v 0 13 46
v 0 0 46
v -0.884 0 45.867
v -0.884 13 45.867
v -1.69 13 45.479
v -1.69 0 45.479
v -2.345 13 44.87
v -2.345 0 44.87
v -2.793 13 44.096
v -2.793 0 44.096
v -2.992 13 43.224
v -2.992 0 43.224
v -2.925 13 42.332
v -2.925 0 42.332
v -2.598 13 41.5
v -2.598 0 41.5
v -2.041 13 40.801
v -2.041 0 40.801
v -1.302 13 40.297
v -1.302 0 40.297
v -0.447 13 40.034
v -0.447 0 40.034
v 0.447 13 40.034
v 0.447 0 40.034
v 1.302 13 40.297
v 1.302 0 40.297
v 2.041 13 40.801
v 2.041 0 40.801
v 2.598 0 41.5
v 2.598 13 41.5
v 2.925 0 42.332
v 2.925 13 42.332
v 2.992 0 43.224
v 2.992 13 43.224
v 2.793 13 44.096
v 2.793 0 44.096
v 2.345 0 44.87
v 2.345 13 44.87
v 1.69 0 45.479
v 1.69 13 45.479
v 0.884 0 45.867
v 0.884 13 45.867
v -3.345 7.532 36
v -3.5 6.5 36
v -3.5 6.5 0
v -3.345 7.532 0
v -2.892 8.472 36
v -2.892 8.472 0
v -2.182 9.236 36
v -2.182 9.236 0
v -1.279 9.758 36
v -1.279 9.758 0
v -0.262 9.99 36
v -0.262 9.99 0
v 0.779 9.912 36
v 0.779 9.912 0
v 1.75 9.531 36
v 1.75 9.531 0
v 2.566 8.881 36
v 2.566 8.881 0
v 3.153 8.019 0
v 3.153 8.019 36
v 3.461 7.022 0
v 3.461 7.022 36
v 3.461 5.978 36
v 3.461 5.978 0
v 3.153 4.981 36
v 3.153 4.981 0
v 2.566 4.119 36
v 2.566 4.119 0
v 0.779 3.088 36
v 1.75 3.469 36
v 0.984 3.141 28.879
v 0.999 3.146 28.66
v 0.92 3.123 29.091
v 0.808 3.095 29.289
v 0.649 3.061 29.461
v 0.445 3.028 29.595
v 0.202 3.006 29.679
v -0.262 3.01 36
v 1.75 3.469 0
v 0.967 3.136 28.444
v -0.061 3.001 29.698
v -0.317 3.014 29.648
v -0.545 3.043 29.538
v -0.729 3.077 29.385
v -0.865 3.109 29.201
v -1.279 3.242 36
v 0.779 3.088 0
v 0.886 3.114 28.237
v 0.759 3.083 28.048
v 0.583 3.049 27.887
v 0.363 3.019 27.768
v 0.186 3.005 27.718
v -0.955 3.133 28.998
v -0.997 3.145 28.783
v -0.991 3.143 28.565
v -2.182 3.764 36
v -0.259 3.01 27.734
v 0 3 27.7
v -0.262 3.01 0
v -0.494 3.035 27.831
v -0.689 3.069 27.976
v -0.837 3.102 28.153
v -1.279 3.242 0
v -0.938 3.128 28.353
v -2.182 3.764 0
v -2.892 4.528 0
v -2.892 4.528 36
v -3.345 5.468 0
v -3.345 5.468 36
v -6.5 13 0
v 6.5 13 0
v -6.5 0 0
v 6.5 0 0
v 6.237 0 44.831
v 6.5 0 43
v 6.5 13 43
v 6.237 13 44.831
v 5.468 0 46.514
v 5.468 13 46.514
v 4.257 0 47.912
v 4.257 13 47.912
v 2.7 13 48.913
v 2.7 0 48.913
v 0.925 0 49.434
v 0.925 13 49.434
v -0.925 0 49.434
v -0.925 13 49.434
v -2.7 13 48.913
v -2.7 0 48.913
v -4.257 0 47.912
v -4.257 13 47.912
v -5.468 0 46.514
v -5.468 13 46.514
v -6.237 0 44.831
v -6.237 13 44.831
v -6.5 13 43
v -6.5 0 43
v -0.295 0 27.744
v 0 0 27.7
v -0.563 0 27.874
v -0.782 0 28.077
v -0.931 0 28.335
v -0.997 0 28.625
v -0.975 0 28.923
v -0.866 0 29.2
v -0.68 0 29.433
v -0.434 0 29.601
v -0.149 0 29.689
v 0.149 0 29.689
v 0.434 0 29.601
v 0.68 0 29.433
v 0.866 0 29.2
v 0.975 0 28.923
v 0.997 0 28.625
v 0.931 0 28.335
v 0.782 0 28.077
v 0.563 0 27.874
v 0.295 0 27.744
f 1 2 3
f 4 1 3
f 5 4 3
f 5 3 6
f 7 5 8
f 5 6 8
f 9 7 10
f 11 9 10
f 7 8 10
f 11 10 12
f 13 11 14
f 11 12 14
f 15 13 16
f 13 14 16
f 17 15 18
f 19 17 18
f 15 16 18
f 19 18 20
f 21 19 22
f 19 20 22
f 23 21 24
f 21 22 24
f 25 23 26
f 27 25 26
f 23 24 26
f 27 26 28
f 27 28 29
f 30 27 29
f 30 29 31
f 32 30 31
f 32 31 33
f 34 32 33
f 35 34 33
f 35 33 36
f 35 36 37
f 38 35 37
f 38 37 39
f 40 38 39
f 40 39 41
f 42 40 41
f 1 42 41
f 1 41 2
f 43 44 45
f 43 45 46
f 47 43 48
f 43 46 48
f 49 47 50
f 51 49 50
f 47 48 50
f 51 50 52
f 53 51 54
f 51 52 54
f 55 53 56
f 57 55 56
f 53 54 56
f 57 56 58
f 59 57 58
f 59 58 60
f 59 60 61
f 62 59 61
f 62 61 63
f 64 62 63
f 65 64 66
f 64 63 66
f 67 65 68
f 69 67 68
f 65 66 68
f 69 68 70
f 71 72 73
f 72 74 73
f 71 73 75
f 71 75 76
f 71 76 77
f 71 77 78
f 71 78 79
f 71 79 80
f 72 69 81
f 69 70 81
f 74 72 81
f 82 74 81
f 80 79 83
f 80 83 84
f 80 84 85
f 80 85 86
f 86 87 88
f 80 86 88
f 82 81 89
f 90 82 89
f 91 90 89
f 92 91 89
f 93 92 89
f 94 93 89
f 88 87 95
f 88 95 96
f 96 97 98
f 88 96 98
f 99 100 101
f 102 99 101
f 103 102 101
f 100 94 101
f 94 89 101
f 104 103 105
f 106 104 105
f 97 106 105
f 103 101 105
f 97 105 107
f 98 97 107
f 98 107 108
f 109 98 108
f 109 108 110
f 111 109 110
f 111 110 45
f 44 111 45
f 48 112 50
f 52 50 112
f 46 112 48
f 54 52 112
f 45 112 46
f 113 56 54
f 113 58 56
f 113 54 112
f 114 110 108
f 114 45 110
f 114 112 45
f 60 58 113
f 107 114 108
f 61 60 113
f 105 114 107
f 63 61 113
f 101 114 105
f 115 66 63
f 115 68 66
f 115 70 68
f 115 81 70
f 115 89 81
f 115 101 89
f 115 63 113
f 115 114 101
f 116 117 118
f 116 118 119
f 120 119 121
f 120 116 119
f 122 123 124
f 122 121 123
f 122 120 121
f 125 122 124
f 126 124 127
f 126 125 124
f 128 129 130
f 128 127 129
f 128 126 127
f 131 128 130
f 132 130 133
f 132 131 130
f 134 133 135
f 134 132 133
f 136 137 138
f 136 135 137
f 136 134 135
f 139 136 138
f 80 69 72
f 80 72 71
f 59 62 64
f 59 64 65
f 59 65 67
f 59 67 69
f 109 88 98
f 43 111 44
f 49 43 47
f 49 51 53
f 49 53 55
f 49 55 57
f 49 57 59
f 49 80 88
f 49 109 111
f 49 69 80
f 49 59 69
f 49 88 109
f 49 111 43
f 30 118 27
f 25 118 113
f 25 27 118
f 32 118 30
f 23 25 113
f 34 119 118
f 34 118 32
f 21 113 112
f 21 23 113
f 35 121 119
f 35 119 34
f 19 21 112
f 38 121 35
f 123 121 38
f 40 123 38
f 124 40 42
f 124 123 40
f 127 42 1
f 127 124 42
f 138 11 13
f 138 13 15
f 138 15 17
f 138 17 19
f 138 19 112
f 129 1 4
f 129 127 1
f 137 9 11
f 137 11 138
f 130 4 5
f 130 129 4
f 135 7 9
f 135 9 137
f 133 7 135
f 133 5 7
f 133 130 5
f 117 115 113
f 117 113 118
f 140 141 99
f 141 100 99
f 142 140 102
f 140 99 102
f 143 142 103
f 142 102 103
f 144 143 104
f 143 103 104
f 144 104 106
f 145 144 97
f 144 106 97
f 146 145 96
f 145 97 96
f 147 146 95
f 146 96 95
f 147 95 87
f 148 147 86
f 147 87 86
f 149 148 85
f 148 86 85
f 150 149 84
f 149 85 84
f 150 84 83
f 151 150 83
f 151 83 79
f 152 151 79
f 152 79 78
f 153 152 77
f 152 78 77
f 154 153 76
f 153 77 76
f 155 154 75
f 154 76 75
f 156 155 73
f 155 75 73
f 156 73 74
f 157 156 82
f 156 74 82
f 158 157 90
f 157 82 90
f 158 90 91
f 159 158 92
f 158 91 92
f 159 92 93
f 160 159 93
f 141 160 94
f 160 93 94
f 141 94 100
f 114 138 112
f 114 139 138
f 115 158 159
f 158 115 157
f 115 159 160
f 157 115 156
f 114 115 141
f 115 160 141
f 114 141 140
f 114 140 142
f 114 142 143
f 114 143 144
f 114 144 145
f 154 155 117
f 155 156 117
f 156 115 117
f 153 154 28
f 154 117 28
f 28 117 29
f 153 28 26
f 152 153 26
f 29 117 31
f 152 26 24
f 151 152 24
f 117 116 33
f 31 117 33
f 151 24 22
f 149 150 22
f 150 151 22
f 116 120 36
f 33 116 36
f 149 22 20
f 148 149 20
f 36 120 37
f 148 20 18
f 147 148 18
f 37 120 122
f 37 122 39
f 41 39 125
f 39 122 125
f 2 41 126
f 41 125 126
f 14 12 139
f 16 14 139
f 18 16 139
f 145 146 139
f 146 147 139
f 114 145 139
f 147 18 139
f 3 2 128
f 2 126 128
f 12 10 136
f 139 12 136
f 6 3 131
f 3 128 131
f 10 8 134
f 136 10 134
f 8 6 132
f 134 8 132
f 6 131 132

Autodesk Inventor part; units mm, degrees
ref_plane "YZ Plane" through (0, 0, 0) normal (1, 0, 0) x (0, 1, 0)
ref_plane "XZ Plane" through (0, 0, 0) normal (0, 1, 0) x (-1, 0, 0)
ref_plane "XY Plane" through (0, 0, 0) normal (0, 0, 1) x (1, 0, 0)
sketch "Skizze1" plane through (0, 0, 0) normal (0, 1, 0) x (-1, 0, 0)
  line L0 (6.5, 0) -> (-6.5, 0)
  line L1 (-6.5, 0) -> (-6.5, 43)
  arc A0 (6.5, 43) -> (-6.5, 43) centre (0, 43) ccw
  line L2 (6.5, 43) -> (6.5, 0)
  line L3 (0, 0) -> (0, 43) construction
  point P0 (0, 0)
  dimension "d0" = 13
  dimension "d1" = 43
  dimension "d2" = 6.5
  dimension "d3" = 6.5
extrude "Extrusion1" add sketch "Skizze1" along normal blind 13
sketch "Skizze2" plane through (0, 13, 0) normal (0, 1, 0) x (1, 0, 0)
  arc A0 (-6.5, -43) -> (6.5, -43) centre (0, -43) ccw projected
  point P0 (0, 0)
hole "Bohrung1" at (0, 13, 43) direction (0, -1, 0) diameter 6 depth 13
sketch "Skizze3" plane through (6.5, 0, 0) normal (0, 0, -1) x (-1, 0, 0)
  circle A0 centre (6.5, 6.5) radius 3.5
  line L0 (0, 0) -> (0, 13) projected
  line L1 (0, 0) -> (13, 0) projected
  point P0 (6.5, 0)
  point P1 (0, 6.5)
  point P2 (6.5, 0)
  dimension "d13" = 7
extrude "Extrusion2" cut sketch "Skizze3" against normal blind 36
sketch "Skizze4" plane through (0, 0, 0) normal (0, -1, 0) x (1, 0, 0)
  circle A0 centre (0, 43) radius 3 projected
  point P0 (0, 0)
  point P1 (0, 28.7)
  dimension "d23" = 14.3
hole "Bohrung2" at (0, 0, 28.7) direction (0, 1, 0) diameter 2 depth 4
properties part number "adapter" material "Aluminium 6061"
